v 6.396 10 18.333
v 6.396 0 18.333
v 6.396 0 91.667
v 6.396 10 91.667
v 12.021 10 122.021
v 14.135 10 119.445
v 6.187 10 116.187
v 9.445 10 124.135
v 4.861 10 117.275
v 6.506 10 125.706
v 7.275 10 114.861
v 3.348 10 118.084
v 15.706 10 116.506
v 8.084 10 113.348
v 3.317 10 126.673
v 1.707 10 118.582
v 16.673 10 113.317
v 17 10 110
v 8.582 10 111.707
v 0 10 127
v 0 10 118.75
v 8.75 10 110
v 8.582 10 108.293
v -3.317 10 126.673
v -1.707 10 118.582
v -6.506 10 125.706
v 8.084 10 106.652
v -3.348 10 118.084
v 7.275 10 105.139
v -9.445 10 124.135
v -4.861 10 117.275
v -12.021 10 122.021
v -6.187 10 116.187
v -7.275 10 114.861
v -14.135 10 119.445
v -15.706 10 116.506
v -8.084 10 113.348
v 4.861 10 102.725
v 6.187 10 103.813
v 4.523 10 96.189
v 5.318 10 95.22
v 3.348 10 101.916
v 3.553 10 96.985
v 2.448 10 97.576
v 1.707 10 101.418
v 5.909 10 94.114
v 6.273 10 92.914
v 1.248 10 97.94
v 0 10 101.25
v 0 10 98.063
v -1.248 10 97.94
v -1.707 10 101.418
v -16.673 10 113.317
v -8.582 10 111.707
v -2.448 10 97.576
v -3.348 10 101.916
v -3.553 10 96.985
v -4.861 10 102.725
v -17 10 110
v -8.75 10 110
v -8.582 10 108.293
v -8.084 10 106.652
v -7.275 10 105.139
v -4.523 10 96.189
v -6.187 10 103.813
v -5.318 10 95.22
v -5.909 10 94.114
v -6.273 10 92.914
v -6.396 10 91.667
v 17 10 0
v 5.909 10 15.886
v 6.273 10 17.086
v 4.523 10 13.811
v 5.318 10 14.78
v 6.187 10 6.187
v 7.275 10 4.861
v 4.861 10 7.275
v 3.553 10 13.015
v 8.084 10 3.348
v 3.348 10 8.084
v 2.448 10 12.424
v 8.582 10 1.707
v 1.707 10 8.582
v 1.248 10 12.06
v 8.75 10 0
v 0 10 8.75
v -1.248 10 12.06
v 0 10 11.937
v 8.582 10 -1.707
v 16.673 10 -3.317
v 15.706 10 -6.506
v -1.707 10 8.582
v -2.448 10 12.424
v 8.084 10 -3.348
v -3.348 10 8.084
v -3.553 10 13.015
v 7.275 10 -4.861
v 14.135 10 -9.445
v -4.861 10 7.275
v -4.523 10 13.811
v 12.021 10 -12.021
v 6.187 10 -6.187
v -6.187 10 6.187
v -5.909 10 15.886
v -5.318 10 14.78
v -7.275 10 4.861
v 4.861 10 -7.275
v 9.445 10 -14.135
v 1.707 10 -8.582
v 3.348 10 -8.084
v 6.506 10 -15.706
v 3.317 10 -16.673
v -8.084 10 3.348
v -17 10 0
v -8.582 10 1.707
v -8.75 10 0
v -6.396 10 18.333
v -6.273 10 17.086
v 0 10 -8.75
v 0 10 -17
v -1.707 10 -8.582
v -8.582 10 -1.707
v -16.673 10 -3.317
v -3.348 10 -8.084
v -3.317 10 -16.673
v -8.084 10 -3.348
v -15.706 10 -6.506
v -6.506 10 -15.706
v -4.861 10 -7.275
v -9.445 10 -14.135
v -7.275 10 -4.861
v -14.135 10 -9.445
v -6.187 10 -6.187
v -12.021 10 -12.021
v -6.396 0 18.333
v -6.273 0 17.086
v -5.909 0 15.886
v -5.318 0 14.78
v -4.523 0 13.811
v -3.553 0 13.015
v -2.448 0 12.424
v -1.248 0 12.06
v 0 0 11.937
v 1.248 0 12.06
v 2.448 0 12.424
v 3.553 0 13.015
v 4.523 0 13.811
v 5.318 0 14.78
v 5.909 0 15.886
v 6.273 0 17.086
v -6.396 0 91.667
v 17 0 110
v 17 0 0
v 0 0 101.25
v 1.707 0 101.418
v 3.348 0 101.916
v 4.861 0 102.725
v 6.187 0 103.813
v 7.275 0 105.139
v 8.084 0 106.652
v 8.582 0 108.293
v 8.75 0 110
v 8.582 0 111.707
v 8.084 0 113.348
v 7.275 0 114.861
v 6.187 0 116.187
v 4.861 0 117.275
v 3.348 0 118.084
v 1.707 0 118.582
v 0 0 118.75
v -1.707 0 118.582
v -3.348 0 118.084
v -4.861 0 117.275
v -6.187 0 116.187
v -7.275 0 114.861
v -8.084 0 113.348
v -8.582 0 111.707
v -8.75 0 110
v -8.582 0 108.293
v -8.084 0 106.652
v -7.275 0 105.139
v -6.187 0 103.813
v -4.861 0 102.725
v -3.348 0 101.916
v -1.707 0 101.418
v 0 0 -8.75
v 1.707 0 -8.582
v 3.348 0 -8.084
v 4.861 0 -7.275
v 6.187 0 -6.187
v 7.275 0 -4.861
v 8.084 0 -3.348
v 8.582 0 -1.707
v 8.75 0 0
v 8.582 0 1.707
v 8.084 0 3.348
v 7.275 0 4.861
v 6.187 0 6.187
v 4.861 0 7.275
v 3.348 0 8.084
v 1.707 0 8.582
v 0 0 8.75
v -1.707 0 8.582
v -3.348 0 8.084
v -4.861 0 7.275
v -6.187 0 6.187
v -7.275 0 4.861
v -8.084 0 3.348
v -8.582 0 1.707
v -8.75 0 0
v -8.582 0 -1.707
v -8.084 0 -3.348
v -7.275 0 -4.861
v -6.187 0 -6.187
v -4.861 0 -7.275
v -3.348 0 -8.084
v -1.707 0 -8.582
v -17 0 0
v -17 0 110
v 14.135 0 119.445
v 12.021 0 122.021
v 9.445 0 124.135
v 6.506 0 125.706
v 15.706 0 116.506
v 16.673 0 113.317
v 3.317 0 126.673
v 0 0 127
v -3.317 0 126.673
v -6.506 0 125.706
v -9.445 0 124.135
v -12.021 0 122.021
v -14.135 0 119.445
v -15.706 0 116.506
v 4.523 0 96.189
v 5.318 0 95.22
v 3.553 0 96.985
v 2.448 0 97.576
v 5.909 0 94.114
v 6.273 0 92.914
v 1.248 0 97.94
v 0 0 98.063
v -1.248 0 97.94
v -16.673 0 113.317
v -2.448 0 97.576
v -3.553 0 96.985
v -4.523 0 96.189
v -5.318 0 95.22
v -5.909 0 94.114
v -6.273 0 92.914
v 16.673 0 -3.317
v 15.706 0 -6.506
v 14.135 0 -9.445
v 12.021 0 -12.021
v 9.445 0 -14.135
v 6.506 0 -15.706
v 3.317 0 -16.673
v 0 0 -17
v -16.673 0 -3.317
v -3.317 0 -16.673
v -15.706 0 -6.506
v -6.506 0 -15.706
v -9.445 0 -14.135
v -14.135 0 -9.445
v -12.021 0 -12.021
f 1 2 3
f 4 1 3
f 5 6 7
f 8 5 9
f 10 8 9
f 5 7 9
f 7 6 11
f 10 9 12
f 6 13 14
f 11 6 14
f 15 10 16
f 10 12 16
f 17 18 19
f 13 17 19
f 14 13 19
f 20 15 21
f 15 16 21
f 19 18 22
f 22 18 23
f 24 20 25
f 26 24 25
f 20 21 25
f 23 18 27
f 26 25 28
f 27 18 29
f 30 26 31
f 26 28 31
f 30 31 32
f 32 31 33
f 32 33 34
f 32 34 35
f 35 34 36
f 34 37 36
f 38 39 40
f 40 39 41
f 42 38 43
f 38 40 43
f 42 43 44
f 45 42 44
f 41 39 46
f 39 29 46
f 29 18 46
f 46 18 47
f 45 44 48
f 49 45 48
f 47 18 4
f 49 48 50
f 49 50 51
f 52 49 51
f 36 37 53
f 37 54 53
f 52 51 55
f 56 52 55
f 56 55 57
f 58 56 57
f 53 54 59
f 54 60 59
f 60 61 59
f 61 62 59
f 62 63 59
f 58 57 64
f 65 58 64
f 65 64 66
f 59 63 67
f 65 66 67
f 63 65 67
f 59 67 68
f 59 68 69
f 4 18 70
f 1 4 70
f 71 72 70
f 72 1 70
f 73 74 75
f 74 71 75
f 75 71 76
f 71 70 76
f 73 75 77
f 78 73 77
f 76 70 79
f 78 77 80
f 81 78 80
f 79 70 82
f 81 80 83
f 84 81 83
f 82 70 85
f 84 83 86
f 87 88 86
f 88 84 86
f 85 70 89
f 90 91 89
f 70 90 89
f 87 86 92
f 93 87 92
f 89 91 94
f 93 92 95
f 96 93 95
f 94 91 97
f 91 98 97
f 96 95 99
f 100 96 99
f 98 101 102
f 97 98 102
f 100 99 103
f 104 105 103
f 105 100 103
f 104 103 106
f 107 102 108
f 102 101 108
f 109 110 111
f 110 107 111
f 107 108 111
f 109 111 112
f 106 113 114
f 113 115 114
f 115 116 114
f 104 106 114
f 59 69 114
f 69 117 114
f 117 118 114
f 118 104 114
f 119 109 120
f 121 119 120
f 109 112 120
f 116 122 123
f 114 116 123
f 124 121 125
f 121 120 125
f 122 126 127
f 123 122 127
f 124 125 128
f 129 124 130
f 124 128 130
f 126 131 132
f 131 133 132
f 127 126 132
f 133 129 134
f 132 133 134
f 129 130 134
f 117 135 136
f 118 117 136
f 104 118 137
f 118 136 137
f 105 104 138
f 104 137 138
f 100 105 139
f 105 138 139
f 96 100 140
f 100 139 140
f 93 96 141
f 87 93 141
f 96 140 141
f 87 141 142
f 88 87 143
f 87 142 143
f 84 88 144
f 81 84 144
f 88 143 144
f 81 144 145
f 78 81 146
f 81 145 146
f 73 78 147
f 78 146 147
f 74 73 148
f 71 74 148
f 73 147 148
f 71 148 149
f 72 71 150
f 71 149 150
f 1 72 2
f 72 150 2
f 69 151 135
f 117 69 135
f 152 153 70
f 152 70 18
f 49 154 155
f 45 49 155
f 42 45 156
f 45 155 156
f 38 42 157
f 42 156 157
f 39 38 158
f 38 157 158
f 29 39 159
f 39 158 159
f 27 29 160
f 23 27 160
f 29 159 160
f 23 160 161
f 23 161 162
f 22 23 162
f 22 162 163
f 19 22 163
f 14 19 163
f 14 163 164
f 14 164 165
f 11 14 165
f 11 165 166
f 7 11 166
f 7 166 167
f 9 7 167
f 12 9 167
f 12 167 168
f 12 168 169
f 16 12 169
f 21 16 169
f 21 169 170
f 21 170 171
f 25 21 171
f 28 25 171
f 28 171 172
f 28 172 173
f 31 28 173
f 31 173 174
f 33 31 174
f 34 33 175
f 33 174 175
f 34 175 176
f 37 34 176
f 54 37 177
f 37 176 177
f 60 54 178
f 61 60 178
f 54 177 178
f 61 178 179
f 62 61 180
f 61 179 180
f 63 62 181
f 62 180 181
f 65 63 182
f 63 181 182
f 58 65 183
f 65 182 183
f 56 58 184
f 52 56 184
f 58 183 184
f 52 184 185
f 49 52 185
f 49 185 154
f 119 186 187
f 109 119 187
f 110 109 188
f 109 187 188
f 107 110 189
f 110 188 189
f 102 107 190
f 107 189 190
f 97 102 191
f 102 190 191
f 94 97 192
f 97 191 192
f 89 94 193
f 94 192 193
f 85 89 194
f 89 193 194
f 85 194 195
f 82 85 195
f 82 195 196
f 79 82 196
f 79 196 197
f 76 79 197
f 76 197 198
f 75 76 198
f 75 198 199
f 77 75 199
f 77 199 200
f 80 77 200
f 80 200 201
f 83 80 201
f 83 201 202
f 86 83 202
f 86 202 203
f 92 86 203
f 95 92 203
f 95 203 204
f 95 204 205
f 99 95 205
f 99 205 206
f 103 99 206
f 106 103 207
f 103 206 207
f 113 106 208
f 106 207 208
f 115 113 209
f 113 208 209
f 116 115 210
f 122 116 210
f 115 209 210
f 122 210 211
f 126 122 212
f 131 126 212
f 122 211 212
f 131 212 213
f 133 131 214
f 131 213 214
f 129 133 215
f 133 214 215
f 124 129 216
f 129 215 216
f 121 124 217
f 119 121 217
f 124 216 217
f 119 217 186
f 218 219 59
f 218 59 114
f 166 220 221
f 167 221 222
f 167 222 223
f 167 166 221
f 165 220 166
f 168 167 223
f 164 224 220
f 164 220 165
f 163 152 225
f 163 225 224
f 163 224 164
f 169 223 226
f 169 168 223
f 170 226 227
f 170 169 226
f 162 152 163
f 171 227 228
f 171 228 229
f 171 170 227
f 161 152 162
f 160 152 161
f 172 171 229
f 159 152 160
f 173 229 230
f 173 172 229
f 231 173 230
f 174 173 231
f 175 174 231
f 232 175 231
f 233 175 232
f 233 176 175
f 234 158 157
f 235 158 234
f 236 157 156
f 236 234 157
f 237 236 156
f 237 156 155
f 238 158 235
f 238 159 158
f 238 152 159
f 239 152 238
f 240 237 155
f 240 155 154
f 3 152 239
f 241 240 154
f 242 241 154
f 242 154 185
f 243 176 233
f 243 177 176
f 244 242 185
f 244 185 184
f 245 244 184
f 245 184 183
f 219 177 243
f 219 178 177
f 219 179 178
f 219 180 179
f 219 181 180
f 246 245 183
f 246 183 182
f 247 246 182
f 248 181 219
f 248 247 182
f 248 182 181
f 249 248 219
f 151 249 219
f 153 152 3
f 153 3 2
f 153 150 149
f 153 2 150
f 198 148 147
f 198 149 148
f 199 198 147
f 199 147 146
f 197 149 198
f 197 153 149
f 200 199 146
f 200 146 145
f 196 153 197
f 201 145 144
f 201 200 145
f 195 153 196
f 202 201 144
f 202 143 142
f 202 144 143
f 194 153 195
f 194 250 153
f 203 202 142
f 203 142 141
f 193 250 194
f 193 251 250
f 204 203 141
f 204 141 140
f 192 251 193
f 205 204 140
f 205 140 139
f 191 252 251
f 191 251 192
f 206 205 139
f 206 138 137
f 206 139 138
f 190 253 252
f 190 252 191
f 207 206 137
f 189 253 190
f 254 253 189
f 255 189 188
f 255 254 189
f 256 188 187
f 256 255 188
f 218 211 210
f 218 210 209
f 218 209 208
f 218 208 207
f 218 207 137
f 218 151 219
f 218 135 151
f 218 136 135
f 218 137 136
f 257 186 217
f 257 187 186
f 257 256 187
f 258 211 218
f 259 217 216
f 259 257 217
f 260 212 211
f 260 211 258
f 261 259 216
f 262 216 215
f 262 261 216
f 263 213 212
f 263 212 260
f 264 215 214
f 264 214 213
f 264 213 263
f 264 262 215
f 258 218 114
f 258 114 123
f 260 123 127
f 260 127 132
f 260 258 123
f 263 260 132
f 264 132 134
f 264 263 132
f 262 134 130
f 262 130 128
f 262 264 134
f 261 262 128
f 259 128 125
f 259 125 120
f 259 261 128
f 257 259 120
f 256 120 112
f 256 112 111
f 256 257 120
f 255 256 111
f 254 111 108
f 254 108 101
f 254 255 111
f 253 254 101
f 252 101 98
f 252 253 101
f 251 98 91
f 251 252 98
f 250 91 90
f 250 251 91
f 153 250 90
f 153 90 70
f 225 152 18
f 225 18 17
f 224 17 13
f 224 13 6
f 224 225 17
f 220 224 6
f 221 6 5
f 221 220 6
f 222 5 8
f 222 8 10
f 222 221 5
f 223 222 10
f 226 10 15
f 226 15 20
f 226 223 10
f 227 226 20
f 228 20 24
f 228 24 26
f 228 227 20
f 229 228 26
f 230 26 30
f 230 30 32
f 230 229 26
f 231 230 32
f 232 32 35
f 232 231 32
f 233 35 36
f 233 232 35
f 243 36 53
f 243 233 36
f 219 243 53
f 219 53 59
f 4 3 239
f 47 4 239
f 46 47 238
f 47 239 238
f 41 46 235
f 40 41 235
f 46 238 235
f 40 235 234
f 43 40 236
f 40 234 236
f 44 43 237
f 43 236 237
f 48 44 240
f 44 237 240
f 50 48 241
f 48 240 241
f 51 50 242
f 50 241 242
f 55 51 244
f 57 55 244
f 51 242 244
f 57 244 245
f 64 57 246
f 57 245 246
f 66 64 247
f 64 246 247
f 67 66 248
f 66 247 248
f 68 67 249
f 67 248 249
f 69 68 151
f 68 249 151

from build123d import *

# Parameters (mm, degrees)
BOSS_EXTRUDE1_DEPTH             = 10
M16_CLEARANCE_HOLE1_D           = 17.5
M16_CLEARANCE_HOLE1_ON_FACE_2_D = 17.5


with BuildPart() as part:
    # Sketch1 → Boss-Extrude1 (new body)
    with BuildSketch(Plane(origin=(0, 0, 0), x_dir=(1, 0, 0), z_dir=(0, 1, 0))):
        with BuildLine():
            Line((17, 0), (17, -110))
            ThreePointArc((17, -110), (0, -127), (-17, -110))
            Line((-17, -110), (-17, 0))
            ThreePointArc((-17, 0), (0, 17), (17, 0))
        make_face()
        with BuildLine():
            Line((-6.39610115, -91.666666667), (-6.39610115, -18.333333333))
            ThreePointArc((-6.39610115, -18.333333333), (0, -11.937232183), (6.39610115, -18.333333333))
            Line((6.39610115, -18.333333333), (6.39610115, -91.666666667))
            ThreePointArc((6.39610115, -91.666666667), (0, -98.062767817), (-6.39610115, -91.666666667))
        make_face(mode=Mode.SUBTRACT)
    extrude(amount=BOSS_EXTRUDE1_DEPTH)

    # M16 Clearance Hole1 (through all)
    with Locations(Plane(origin=(0, 10, 110), x_dir=(0, 0, 1), z_dir=(0, 1, 0))):
        with Locations((0, 0), (-110, 0)):
            Hole(M16_CLEARANCE_HOLE1_D / 2)

    # M16 Clearance Hole1 on face 2 (through all)
    with Locations(Plane(origin=(0, 0, 0), x_dir=(0, 0, -1), z_dir=(0, -1, 0))):
        with Locations((0, 0)):
            Hole(M16_CLEARANCE_HOLE1_ON_FACE_2_D / 2)


solid = part.part
